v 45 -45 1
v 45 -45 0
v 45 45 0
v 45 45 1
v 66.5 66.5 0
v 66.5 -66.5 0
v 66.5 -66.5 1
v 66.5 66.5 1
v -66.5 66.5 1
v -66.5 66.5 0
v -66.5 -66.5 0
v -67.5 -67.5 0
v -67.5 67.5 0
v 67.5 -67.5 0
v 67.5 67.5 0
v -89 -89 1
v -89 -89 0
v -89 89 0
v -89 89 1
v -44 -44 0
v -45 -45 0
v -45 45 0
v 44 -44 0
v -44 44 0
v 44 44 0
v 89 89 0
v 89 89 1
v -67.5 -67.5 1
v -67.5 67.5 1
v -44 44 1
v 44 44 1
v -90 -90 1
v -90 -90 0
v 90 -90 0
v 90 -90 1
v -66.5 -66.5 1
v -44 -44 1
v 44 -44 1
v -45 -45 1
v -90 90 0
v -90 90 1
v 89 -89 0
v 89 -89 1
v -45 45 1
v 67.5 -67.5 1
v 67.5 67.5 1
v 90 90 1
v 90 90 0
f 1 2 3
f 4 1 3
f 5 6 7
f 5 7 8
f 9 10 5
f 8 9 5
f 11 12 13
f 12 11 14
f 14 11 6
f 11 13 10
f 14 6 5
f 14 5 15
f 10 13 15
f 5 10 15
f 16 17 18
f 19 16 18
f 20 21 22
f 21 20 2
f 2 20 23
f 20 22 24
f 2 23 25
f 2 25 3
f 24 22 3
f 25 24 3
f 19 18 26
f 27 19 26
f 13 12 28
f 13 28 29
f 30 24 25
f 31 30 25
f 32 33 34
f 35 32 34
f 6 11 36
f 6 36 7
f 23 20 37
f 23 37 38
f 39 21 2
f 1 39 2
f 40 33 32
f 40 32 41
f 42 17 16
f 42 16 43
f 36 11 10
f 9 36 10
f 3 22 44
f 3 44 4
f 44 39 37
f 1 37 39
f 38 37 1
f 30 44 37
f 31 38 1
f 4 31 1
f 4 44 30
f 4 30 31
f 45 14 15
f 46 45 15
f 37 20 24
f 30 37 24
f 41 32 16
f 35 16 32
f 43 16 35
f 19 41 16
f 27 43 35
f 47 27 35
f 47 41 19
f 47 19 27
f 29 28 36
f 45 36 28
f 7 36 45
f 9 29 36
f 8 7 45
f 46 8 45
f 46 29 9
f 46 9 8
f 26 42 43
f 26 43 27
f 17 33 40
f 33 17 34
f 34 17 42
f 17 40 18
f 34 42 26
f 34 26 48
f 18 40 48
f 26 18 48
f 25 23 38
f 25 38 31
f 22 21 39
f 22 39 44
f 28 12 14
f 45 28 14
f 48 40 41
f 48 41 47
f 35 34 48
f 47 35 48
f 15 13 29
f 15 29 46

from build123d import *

# Parameters (mm, degrees)
F0_W     = 180
F0_H     = 180
F0_W_2   = 178
F0_H_2   = 178
F1_DEPTH = 1
F0_W_3   = 90
F0_H_3   = 90
F0_W_4   = 88
F0_H_4   = 88
F0_W_5   = 135
F0_H_5   = 135
F0_W_6   = 133
F0_H_6   = 133


with BuildPart() as f1:
    # F0 (on Top) → F1 (new body)
    with BuildSketch(Plane.XY):
        Rectangle(F0_W, F0_H)
        Rectangle(F0_W_2, F0_H_2, mode=Mode.SUBTRACT)
    extrude(amount=F1_DEPTH)


with BuildPart() as f1b:
    # F0 (on Top) → F1, piece 2 (new body)
    with BuildSketch(Plane.XY):
        Rectangle(F0_W_3, F0_H_3)
        Rectangle(F0_W_4, F0_H_4, mode=Mode.SUBTRACT)
    extrude(amount=F1_DEPTH)


with BuildPart() as f1c:
    # F0 (on Top) → F1, piece 3 (new body)
    with BuildSketch(Plane.XY):
        Rectangle(F0_W_5, F0_H_5)
        Rectangle(F0_W_6, F0_H_6, mode=Mode.SUBTRACT)
    extrude(amount=F1_DEPTH)


solid = Compound([f1.part, f1b.part, f1c.part])
